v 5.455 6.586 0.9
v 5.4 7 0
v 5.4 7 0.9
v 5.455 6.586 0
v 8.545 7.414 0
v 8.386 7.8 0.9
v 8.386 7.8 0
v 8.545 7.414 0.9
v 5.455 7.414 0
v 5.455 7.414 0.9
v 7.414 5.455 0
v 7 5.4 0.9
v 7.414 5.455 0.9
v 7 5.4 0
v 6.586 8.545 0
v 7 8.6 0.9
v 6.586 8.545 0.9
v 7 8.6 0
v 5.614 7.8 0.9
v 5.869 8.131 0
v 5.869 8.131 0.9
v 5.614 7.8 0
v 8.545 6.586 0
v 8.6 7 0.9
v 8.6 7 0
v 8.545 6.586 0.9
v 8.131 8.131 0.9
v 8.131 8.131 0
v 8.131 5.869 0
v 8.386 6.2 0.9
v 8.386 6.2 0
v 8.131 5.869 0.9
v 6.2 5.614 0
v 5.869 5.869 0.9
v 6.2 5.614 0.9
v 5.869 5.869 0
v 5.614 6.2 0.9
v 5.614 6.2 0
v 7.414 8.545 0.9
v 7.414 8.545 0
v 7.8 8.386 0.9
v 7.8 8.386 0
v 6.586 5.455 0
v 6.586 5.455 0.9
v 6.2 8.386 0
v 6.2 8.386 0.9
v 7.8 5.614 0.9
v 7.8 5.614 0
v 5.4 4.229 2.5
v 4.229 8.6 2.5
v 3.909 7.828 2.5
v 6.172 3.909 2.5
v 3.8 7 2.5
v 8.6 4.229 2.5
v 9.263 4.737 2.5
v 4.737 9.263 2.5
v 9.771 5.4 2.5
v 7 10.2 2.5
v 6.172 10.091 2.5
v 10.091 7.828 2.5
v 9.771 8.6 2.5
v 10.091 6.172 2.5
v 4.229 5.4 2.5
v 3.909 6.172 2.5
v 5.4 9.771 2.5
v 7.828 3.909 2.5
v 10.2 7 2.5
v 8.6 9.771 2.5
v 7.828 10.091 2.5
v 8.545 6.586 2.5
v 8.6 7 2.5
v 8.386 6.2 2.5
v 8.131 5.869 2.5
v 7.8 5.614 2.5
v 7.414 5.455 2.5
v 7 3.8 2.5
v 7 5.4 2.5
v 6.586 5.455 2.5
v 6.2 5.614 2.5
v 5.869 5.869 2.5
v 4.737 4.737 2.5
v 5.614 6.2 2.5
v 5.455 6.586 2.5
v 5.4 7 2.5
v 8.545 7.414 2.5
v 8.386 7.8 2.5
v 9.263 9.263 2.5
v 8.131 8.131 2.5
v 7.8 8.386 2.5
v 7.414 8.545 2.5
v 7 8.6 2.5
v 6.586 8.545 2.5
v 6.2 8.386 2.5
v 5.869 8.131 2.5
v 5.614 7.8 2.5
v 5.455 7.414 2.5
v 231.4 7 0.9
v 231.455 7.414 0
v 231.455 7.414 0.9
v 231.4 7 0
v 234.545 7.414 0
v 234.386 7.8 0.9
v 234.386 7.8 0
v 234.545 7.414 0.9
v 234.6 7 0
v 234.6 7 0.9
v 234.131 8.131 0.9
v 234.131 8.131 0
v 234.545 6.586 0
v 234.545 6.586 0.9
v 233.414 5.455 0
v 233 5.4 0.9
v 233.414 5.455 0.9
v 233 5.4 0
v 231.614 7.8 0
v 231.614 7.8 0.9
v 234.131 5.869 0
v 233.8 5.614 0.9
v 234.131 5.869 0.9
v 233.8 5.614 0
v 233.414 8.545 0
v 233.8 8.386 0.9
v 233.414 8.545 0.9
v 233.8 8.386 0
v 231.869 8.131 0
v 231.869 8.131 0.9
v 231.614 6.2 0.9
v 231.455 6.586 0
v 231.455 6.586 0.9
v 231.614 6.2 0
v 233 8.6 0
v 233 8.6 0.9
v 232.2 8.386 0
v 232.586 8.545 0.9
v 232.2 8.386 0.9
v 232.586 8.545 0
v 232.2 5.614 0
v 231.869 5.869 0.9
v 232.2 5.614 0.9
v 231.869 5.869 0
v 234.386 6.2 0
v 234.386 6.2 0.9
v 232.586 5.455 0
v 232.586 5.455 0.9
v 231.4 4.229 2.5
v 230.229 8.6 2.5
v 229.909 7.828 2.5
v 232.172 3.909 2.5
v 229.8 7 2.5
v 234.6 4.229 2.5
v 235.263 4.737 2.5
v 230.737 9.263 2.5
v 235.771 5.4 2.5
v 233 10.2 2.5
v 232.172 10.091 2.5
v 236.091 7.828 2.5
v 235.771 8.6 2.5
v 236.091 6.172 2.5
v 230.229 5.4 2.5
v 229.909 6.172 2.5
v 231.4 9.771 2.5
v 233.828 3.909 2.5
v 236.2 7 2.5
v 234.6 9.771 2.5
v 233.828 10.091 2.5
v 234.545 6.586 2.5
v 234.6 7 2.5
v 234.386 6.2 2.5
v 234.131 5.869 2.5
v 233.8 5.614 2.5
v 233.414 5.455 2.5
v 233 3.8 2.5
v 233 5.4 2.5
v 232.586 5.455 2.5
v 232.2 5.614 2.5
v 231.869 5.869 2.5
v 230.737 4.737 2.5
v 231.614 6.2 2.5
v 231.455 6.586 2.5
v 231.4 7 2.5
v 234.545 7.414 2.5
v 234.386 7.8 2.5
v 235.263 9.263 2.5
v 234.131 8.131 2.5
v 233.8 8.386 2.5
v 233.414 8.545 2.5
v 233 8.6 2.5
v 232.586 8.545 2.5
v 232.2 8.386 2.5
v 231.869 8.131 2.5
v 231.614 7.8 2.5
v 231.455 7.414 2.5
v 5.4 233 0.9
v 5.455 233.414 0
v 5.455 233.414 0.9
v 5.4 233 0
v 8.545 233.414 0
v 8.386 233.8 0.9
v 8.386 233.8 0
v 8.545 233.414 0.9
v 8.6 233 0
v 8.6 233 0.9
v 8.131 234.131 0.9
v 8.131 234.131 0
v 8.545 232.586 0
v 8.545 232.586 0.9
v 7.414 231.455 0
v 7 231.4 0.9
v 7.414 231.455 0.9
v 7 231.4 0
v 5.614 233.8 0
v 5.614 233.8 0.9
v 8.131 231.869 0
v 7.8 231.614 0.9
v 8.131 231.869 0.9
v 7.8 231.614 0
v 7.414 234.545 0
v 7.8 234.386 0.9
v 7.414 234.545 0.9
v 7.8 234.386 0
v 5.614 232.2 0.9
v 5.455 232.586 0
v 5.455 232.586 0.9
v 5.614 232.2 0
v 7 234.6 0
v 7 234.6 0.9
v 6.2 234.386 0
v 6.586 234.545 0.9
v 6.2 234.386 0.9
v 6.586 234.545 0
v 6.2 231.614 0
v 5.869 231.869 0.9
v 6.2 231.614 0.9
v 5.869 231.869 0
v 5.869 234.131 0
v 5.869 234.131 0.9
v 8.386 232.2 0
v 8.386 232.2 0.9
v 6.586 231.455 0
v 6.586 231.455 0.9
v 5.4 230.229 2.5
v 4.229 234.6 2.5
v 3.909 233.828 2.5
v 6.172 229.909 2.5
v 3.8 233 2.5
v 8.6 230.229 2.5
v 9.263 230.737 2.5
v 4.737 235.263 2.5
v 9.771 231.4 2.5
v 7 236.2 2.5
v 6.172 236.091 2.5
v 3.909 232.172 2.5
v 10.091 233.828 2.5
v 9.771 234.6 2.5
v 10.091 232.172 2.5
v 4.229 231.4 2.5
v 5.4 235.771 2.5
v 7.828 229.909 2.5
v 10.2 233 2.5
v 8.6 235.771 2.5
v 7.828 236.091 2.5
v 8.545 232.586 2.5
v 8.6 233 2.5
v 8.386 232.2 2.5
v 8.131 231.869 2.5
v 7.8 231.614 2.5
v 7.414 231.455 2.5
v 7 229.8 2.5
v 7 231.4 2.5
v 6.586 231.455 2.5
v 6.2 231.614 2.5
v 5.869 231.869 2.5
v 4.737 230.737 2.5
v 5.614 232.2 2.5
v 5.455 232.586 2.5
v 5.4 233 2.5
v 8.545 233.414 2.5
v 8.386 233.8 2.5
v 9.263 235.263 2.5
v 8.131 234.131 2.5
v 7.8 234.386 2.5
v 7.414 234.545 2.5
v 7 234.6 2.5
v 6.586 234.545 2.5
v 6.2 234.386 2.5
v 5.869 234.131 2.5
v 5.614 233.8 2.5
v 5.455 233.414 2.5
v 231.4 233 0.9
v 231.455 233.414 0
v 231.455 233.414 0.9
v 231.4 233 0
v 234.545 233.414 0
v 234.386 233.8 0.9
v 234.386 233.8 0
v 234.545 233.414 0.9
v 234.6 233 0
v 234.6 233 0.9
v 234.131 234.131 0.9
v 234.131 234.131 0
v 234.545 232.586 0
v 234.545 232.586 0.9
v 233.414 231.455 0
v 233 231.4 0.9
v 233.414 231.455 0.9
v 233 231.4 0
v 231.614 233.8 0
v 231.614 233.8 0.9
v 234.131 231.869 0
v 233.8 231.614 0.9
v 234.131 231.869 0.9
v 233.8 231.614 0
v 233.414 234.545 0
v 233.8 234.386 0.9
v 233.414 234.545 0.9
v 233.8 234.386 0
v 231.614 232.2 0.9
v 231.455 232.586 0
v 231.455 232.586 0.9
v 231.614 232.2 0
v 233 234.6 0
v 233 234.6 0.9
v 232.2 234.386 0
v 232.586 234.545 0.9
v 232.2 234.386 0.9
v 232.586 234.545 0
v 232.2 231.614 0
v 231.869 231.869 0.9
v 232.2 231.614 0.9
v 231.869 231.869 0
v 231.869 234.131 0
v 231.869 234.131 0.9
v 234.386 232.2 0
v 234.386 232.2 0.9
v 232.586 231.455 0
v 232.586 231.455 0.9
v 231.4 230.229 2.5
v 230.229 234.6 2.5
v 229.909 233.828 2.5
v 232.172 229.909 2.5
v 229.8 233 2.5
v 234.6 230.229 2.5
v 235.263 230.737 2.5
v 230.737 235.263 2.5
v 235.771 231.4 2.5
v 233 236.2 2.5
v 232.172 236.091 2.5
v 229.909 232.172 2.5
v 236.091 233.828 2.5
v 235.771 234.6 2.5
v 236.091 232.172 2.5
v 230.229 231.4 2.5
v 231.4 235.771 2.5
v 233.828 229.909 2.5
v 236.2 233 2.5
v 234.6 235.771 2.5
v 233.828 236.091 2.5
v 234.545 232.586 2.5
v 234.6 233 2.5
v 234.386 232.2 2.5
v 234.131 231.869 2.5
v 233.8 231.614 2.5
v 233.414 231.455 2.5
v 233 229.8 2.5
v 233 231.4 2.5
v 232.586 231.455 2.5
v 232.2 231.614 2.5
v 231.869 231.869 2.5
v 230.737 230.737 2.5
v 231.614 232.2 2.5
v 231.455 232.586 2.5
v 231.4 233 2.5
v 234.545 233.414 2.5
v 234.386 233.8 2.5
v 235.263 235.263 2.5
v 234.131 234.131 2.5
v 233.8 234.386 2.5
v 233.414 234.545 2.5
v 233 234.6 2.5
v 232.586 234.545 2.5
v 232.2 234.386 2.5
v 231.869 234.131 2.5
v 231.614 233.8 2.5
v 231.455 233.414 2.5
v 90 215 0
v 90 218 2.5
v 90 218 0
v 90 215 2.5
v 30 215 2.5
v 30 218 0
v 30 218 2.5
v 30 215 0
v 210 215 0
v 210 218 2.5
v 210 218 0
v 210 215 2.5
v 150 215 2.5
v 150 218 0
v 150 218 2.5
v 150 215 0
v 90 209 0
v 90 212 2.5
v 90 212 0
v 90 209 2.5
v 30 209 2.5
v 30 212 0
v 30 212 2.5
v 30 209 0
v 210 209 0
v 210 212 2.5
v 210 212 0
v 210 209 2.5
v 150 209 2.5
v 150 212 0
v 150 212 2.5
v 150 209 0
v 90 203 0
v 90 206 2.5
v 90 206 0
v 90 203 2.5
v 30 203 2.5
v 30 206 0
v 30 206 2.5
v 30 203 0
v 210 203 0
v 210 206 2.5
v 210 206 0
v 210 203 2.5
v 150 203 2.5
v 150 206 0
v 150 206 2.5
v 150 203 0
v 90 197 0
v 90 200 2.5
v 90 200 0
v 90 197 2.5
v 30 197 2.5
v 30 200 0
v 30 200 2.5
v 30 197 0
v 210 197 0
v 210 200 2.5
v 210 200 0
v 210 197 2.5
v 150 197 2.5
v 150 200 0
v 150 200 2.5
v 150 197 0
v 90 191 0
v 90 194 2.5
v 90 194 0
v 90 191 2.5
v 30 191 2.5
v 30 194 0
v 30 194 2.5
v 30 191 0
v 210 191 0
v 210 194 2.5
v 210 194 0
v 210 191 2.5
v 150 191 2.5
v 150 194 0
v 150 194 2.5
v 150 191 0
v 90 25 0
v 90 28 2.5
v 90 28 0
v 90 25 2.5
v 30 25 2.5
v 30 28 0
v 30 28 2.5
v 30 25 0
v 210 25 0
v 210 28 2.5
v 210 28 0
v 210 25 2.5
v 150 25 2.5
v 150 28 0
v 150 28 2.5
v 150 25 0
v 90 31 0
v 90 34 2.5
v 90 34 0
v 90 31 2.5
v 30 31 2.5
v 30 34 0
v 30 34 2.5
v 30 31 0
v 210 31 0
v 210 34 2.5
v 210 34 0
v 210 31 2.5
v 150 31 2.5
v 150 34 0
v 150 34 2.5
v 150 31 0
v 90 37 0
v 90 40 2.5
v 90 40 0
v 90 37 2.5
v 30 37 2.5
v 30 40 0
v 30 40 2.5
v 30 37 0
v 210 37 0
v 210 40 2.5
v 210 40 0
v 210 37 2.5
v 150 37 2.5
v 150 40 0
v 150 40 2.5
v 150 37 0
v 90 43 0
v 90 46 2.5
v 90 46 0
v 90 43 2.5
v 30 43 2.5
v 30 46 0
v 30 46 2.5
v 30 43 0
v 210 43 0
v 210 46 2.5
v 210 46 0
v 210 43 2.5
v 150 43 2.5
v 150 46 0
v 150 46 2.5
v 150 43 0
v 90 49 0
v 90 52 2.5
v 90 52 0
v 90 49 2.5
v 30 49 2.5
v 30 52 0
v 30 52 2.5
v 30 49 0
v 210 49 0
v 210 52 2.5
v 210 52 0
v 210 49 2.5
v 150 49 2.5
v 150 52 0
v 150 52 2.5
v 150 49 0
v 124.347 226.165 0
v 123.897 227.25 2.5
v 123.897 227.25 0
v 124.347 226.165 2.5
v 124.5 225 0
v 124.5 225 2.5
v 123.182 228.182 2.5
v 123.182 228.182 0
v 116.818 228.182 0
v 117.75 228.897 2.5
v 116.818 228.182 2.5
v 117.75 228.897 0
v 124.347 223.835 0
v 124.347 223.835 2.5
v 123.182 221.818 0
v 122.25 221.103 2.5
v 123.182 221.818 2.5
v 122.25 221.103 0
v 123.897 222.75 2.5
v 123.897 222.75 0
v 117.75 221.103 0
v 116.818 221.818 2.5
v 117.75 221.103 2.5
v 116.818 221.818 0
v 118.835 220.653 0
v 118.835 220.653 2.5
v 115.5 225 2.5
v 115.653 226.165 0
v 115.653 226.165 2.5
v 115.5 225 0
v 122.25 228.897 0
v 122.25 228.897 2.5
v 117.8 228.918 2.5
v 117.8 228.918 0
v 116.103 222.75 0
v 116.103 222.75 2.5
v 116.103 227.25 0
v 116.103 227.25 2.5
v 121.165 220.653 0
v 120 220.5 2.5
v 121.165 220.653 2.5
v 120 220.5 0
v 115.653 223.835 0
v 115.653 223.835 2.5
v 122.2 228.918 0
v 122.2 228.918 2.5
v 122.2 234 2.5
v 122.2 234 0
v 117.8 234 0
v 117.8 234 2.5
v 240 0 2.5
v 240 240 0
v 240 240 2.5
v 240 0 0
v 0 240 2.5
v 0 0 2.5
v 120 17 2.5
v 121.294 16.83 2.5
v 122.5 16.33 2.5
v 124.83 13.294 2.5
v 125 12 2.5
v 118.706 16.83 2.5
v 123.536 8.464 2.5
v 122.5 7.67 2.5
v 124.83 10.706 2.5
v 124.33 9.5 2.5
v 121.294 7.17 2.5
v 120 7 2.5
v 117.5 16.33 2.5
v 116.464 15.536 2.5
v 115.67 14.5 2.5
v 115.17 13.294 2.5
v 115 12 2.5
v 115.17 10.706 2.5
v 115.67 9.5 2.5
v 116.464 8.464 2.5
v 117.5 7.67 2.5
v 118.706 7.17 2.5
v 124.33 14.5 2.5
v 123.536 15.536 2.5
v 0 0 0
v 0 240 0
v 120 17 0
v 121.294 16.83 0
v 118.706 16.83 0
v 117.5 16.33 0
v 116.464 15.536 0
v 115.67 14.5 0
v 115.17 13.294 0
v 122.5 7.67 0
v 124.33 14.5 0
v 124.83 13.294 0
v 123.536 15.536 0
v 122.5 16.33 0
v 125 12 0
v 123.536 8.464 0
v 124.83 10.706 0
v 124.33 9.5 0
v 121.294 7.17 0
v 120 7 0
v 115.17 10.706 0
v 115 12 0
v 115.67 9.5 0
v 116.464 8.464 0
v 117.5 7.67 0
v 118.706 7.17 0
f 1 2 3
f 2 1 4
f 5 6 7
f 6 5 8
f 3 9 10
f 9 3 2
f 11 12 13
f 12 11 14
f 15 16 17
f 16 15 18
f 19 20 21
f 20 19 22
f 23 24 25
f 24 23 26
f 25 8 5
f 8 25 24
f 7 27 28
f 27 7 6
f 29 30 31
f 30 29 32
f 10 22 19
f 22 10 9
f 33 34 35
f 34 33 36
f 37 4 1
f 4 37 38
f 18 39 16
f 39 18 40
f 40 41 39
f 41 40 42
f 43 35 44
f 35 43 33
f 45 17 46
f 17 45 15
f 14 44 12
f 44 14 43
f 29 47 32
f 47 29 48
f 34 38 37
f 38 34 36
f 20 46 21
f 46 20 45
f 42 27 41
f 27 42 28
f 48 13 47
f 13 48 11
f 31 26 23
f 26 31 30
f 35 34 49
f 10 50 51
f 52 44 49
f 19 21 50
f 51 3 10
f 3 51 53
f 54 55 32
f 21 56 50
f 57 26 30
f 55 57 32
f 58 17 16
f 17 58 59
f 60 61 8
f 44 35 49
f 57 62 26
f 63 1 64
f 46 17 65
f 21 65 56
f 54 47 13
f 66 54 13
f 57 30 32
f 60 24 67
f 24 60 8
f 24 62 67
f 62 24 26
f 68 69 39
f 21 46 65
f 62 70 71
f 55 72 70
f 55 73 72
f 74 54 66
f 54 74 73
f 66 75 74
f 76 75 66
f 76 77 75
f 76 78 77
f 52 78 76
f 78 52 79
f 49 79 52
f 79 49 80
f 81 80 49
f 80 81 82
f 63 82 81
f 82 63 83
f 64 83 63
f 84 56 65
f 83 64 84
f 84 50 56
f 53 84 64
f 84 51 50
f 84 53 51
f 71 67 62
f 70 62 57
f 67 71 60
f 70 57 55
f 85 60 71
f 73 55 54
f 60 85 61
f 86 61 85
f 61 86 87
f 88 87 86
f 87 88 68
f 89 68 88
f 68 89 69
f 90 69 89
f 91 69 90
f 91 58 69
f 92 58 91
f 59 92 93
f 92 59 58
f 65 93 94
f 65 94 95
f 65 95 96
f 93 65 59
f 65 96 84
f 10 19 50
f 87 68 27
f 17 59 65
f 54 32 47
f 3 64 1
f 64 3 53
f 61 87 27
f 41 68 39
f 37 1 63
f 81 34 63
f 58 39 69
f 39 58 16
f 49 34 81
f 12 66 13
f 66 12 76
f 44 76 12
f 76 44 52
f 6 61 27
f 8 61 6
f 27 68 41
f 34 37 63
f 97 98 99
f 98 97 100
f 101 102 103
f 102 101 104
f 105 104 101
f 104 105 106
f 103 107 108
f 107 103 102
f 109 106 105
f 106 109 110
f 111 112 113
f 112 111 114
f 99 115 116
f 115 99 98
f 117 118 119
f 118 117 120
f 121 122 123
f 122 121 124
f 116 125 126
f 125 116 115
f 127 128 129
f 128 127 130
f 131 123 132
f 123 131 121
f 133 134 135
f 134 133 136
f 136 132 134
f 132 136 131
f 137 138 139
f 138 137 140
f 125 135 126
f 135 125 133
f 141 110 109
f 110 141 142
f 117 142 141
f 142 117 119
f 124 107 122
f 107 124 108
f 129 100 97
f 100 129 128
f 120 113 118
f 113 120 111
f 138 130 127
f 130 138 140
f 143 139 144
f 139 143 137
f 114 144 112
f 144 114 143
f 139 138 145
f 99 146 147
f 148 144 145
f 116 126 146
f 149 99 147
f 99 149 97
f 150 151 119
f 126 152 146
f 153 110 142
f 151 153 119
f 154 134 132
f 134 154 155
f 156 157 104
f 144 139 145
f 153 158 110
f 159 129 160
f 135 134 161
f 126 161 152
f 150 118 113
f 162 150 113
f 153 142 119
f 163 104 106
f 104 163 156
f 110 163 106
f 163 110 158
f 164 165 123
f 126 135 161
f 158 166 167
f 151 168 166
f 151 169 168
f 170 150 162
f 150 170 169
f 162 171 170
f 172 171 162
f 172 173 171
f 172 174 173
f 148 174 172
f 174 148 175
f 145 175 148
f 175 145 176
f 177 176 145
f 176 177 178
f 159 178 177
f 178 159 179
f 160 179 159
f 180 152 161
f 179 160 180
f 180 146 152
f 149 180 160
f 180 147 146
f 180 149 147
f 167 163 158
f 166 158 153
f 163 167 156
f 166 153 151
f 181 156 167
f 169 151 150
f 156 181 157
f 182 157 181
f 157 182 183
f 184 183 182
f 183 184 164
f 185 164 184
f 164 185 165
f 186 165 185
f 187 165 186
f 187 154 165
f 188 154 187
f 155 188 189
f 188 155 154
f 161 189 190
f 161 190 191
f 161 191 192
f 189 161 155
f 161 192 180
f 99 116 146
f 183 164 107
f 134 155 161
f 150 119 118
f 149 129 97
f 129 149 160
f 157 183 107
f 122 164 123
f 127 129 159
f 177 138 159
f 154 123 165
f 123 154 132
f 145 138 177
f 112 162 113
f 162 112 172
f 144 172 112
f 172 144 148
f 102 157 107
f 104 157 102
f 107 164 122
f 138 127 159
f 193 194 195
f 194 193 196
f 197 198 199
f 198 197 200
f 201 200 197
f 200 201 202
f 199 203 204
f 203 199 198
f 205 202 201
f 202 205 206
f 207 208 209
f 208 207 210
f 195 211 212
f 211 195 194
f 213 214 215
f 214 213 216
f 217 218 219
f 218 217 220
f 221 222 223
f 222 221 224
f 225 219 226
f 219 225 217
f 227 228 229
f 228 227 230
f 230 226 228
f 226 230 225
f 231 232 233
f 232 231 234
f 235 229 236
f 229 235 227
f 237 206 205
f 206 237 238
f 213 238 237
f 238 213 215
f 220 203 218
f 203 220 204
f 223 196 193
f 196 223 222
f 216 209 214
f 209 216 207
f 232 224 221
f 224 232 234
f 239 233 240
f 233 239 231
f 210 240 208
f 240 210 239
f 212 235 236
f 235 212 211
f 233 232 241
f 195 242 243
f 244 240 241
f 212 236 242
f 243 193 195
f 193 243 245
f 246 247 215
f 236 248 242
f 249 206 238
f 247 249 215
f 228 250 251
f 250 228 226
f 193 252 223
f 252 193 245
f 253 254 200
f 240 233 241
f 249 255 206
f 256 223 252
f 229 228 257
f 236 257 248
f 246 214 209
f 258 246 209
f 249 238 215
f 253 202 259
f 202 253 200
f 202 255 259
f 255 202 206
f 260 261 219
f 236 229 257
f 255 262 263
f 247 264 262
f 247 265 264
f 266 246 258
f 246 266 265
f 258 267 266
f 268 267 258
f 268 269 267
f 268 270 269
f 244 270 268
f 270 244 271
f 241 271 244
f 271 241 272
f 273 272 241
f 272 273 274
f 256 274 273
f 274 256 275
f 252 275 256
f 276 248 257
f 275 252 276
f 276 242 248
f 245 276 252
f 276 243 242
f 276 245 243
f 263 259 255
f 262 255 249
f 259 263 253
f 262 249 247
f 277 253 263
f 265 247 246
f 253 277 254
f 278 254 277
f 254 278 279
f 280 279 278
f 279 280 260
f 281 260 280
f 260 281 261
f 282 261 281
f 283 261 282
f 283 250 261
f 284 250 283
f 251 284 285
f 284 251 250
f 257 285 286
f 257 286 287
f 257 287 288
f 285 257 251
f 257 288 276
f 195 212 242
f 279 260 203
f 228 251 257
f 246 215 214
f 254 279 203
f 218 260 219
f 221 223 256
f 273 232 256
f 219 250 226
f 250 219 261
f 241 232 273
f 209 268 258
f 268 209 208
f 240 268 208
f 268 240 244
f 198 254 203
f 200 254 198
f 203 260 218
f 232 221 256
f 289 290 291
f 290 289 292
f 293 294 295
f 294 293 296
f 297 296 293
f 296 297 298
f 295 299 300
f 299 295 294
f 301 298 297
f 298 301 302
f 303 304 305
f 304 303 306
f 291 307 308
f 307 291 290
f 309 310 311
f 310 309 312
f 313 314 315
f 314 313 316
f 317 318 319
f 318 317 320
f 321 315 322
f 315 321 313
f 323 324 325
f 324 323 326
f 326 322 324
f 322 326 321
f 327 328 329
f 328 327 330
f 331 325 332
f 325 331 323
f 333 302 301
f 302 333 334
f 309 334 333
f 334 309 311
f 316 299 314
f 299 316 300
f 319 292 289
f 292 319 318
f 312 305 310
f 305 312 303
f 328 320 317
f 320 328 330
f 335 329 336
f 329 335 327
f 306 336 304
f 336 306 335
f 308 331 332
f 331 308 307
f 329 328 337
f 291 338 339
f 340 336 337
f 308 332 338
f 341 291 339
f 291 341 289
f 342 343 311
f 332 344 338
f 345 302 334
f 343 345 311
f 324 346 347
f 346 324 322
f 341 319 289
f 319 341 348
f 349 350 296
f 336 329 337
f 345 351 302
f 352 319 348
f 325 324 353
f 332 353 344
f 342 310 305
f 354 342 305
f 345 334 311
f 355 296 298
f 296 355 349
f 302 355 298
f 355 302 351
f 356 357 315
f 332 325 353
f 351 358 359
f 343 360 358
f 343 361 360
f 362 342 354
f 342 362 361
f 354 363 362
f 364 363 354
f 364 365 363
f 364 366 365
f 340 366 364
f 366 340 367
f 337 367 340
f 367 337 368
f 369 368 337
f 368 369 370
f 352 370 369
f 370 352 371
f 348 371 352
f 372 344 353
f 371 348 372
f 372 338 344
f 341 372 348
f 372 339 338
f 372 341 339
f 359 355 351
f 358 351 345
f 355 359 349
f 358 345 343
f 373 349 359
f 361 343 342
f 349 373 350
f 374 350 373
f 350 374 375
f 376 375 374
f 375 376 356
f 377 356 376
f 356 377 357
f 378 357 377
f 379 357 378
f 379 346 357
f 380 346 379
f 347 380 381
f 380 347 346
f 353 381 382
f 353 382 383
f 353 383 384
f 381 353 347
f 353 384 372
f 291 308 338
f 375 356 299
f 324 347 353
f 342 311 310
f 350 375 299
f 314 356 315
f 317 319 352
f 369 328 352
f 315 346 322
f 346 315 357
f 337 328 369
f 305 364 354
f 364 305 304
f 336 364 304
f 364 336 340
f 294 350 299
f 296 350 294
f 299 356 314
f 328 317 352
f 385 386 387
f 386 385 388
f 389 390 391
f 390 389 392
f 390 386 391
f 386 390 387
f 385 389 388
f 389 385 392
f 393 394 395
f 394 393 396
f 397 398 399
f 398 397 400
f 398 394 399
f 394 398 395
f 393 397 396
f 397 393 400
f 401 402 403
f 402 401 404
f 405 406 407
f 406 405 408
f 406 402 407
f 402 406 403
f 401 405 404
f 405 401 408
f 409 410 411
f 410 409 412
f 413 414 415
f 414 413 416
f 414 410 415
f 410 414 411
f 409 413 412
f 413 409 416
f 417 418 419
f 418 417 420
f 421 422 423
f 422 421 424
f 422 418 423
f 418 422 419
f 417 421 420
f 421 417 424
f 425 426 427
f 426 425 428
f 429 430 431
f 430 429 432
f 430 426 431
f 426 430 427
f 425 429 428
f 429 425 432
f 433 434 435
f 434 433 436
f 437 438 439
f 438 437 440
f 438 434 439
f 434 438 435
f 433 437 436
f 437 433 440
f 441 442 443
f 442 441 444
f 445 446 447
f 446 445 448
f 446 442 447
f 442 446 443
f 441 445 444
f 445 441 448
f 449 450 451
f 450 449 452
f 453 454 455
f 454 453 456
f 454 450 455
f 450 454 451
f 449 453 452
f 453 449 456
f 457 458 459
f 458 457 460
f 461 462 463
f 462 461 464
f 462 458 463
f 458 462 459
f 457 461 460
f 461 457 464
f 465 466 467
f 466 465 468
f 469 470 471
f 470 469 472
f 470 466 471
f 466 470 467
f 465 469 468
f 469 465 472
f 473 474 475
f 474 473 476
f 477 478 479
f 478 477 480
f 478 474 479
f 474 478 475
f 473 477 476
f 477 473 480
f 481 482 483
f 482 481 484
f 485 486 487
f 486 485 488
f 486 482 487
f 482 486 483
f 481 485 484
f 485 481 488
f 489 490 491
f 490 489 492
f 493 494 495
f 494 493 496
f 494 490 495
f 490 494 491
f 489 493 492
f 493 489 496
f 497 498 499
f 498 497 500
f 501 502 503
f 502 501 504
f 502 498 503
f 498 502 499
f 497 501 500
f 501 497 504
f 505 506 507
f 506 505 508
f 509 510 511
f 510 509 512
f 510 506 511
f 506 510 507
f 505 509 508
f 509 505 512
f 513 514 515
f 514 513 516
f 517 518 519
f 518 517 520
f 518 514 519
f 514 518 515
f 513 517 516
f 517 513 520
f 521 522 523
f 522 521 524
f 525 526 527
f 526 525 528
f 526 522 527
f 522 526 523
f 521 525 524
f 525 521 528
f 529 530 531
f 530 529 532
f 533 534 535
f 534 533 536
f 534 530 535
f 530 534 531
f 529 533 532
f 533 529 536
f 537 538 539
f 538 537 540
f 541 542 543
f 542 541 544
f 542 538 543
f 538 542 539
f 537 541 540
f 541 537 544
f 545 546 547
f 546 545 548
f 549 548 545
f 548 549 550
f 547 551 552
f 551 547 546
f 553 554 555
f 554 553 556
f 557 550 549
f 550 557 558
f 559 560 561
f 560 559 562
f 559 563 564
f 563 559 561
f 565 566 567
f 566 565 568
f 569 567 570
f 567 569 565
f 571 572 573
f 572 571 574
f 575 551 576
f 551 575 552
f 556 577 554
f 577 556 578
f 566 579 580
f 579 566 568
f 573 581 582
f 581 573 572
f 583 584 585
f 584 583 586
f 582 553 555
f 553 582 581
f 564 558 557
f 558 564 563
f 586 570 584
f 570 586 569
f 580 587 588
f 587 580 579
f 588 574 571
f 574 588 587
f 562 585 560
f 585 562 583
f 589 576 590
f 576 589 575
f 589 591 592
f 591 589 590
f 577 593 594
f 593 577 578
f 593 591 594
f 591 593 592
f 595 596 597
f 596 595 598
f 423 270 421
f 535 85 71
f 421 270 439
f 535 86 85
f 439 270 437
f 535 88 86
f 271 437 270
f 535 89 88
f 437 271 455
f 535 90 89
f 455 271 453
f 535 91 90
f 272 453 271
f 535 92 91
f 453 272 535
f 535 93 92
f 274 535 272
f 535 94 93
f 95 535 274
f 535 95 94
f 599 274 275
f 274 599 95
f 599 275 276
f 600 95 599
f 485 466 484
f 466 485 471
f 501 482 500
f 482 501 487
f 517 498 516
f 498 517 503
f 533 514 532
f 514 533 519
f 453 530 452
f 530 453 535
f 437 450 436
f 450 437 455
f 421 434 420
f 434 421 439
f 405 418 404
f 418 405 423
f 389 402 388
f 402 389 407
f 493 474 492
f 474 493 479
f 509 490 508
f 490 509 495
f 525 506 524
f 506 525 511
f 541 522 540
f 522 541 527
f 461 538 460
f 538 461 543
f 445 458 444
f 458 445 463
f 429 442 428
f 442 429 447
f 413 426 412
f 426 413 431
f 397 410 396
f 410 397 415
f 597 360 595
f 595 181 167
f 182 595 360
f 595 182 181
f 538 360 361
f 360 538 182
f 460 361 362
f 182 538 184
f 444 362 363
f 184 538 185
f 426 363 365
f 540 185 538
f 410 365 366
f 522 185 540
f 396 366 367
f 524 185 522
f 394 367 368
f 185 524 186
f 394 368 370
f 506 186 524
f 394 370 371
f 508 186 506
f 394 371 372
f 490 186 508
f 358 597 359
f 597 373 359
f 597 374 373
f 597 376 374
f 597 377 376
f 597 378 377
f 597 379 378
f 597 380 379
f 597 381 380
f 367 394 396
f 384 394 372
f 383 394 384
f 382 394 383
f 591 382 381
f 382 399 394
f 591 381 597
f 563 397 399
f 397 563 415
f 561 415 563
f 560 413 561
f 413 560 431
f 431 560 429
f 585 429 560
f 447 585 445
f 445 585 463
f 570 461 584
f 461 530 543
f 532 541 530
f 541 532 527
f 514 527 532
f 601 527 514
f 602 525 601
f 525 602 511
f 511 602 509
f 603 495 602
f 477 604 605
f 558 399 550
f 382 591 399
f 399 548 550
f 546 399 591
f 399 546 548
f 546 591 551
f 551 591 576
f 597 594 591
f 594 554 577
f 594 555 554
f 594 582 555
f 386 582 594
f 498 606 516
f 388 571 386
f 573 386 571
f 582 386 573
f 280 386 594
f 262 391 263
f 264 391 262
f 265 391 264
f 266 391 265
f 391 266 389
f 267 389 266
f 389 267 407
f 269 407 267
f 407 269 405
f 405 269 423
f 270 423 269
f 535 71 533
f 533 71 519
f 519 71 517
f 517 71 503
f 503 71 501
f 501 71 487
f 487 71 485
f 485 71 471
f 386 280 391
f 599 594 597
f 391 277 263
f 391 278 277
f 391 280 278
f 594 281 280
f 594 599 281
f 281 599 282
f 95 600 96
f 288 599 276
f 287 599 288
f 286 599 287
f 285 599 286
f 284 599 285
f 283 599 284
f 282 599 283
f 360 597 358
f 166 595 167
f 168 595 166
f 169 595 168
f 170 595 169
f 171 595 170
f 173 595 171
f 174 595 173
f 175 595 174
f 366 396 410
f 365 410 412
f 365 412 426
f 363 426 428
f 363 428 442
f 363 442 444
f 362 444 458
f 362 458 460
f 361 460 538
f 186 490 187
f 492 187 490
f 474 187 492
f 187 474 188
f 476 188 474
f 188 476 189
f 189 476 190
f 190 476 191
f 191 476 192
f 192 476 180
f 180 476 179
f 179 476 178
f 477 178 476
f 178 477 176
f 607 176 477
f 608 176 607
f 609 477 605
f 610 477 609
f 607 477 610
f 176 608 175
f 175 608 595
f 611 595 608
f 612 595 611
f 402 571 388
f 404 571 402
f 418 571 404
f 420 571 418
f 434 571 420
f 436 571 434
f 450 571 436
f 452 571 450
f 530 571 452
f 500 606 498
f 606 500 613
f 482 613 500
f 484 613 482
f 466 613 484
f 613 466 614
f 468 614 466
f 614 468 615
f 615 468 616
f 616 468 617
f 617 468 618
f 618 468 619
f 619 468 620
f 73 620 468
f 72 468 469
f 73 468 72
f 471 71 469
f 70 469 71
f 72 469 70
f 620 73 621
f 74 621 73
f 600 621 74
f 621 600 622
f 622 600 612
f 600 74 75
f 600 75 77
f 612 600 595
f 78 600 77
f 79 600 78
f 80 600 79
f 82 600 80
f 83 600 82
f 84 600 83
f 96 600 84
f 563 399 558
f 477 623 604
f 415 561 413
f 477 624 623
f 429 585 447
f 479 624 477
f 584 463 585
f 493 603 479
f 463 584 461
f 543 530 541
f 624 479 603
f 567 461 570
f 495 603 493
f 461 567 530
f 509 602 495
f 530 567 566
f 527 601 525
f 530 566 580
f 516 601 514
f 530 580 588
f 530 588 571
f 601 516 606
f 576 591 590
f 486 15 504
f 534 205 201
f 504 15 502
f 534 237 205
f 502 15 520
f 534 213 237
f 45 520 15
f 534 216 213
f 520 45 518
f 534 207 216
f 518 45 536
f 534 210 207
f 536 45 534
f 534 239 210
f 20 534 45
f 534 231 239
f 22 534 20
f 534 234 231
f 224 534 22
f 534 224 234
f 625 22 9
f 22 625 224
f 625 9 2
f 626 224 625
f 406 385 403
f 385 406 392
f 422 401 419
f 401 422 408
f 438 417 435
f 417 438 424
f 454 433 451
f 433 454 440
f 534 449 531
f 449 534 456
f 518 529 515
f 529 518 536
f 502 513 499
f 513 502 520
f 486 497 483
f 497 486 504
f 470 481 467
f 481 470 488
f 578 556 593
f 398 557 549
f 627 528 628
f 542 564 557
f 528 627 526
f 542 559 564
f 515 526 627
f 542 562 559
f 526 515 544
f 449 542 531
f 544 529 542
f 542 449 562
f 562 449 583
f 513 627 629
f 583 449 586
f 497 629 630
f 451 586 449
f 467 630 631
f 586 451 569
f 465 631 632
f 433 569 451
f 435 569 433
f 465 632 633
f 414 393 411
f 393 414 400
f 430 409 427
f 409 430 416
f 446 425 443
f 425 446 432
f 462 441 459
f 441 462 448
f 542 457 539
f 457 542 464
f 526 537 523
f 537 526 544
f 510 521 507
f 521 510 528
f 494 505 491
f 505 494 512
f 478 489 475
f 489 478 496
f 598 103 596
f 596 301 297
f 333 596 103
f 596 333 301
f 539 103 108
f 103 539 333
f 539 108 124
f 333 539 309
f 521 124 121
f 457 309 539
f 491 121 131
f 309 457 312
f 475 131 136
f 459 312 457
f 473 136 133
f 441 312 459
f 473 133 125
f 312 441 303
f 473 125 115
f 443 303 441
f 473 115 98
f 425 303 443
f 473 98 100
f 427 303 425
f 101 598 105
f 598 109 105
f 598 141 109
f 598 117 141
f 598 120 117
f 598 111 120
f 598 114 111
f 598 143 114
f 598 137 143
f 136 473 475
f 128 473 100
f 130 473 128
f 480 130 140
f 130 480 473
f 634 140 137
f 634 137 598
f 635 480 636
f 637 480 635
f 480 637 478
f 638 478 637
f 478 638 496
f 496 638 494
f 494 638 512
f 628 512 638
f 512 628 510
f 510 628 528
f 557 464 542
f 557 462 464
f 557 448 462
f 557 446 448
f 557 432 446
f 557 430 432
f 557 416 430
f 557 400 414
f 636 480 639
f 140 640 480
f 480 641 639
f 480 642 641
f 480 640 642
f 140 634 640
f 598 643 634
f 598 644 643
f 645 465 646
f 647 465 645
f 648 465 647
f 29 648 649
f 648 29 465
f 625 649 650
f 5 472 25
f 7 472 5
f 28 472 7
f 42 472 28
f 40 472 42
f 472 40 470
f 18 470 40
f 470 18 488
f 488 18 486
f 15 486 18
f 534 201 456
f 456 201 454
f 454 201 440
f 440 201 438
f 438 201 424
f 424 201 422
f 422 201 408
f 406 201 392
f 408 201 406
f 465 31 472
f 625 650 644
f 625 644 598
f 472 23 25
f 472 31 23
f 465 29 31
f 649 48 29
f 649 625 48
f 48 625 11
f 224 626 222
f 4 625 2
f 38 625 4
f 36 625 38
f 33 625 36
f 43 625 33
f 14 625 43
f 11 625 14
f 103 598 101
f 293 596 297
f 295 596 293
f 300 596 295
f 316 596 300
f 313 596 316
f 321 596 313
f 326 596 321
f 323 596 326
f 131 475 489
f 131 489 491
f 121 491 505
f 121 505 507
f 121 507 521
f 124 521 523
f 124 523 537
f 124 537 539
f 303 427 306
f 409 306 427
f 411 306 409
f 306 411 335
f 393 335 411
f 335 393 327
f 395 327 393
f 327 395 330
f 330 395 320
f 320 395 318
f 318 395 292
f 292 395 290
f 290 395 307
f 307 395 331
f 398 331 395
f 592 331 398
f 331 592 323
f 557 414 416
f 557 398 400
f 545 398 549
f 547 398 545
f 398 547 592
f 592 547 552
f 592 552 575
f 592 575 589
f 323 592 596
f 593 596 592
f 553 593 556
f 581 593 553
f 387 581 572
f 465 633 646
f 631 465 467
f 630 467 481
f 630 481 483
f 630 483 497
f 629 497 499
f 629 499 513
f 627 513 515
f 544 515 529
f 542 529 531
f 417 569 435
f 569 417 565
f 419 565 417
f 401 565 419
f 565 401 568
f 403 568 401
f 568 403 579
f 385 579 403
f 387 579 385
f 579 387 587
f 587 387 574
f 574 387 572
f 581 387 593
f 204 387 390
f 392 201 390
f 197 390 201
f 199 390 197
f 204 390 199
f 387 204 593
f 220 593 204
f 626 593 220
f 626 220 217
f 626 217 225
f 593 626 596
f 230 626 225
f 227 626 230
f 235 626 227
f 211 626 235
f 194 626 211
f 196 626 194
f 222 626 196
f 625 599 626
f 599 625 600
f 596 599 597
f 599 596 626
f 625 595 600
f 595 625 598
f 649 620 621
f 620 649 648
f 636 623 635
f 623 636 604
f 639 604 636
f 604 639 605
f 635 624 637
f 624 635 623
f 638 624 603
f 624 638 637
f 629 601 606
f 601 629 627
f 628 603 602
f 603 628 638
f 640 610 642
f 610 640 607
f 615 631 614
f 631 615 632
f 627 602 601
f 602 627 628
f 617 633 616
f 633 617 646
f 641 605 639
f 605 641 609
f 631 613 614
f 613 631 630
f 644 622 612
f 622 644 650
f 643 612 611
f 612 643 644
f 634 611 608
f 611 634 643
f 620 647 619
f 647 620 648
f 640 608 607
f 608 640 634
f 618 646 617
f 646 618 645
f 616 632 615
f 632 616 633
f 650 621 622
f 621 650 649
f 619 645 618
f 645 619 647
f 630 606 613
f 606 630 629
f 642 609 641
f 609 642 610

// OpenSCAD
// ==============================================================================
// WORDCLOCK ESP32 - PIEZA 3: TAPA TRASERA CON VENTILACIONES (REAR COVER LID)
// Parametric OpenSCAD Model for Bambu Lab (256x256 mm build plate)
// Square Design: 240.0 x 240.0 mm
// ==============================================================================

// --- Parameters ---
box_w       = 240.0;
box_h       = 240.0;
wall_thick  = 3.0;
lid_thick   = 2.5;     // Grosor de la tapa trasera (mm)

// --- Module: Tapa Trasera Completa ---
module wordclock_back_lid() {
    difference() {
        // 1. Placa Base Cuadrada de la Tapa
        cube([box_w, box_h, lid_thick]);

        // 2. Orificios avellanados (Countersunk) en las 4 esquinas para tornillos M3
        screw_off = wall_thick + 4.0;
        
        // Esquina Inferior Izquierda
        translate([screw_off, screw_off, -0.1]) {
            cylinder(r = 1.6, h = lid_thick + 0.2, $fn = 24);
            translate([0, 0, 1.0]) cylinder(r1 = 1.6, r2 = 3.2, h = 1.6, $fn = 24);
        }
        // Esquina Inferior Derecha
        translate([box_w - screw_off, screw_off, -0.1]) {
            cylinder(r = 1.6, h = lid_thick + 0.2, $fn = 24);
            translate([0, 0, 1.0]) cylinder(r1 = 1.6, r2 = 3.2, h = 1.6, $fn = 24);
        }
        // Esquina Superior Izquierda
        translate([screw_off, box_h - screw_off, -0.1]) {
            cylinder(r = 1.6, h = lid_thick + 0.2, $fn = 24);
            translate([0, 0, 1.0]) cylinder(r1 = 1.6, r2 = 3.2, h = 1.6, $fn = 24);
        }
        // Esquina Superior Derecha
        translate([box_w - screw_off, box_h - screw_off, -0.1]) {
            cylinder(r = 1.6, h = lid_thick + 0.2, $fn = 24);
            translate([0, 0, 1.0]) cylinder(r1 = 1.6, r2 = 3.2, h = 1.6, $fn = 24);
        }

        // 3. Ranuras de Ventilación Superior (Cooling Vents Left & Right)
        for (i = [0 : 4]) {
            y_slot = box_h - 25 - (i * 6);
            // Rejilla Izquierda
            translate([30, y_slot, -0.1]) cube([60, 3.0, lid_thick + 0.2]);
            // Rejilla Derecha
            translate([box_w - 90, y_slot, -0.1]) cube([60, 3.0, lid_thick + 0.2]);
        }

        // 4. Ranuras de Ventilación Inferior (Cooling Vents Left & Right)
        for (i = [0 : 4]) {
            y_slot = 25 + (i * 6);
            // Rejilla Izquierda
            translate([30, y_slot, -0.1]) cube([60, 3.0, lid_thick + 0.2]);
            // Rejilla Derecha
            translate([box_w - 90, y_slot, -0.1]) cube([60, 3.0, lid_thick + 0.2]);
        }

        // 5. Orificio para Conector de Alimentación (Jack DC / Cable USB-C)
        translate([box_w / 2, 12, -0.1]) {
            cylinder(r = 5.0, h = lid_thick + 0.2, $fn = 24);
        }

        // 6. Muesca en forma de cerradura (Keyhole) para colgar en pared
        translate([box_w / 2, box_h - 15, -0.1]) {
            union() {
                cylinder(r = 4.5, h = lid_thick + 0.2, $fn = 24);
                translate([-2.2, 0, 0]) cube([4.4, 9.0, lid_thick + 0.2]);
            }
        }
    }
}

// Generar modelo
wordclock_back_lid();
